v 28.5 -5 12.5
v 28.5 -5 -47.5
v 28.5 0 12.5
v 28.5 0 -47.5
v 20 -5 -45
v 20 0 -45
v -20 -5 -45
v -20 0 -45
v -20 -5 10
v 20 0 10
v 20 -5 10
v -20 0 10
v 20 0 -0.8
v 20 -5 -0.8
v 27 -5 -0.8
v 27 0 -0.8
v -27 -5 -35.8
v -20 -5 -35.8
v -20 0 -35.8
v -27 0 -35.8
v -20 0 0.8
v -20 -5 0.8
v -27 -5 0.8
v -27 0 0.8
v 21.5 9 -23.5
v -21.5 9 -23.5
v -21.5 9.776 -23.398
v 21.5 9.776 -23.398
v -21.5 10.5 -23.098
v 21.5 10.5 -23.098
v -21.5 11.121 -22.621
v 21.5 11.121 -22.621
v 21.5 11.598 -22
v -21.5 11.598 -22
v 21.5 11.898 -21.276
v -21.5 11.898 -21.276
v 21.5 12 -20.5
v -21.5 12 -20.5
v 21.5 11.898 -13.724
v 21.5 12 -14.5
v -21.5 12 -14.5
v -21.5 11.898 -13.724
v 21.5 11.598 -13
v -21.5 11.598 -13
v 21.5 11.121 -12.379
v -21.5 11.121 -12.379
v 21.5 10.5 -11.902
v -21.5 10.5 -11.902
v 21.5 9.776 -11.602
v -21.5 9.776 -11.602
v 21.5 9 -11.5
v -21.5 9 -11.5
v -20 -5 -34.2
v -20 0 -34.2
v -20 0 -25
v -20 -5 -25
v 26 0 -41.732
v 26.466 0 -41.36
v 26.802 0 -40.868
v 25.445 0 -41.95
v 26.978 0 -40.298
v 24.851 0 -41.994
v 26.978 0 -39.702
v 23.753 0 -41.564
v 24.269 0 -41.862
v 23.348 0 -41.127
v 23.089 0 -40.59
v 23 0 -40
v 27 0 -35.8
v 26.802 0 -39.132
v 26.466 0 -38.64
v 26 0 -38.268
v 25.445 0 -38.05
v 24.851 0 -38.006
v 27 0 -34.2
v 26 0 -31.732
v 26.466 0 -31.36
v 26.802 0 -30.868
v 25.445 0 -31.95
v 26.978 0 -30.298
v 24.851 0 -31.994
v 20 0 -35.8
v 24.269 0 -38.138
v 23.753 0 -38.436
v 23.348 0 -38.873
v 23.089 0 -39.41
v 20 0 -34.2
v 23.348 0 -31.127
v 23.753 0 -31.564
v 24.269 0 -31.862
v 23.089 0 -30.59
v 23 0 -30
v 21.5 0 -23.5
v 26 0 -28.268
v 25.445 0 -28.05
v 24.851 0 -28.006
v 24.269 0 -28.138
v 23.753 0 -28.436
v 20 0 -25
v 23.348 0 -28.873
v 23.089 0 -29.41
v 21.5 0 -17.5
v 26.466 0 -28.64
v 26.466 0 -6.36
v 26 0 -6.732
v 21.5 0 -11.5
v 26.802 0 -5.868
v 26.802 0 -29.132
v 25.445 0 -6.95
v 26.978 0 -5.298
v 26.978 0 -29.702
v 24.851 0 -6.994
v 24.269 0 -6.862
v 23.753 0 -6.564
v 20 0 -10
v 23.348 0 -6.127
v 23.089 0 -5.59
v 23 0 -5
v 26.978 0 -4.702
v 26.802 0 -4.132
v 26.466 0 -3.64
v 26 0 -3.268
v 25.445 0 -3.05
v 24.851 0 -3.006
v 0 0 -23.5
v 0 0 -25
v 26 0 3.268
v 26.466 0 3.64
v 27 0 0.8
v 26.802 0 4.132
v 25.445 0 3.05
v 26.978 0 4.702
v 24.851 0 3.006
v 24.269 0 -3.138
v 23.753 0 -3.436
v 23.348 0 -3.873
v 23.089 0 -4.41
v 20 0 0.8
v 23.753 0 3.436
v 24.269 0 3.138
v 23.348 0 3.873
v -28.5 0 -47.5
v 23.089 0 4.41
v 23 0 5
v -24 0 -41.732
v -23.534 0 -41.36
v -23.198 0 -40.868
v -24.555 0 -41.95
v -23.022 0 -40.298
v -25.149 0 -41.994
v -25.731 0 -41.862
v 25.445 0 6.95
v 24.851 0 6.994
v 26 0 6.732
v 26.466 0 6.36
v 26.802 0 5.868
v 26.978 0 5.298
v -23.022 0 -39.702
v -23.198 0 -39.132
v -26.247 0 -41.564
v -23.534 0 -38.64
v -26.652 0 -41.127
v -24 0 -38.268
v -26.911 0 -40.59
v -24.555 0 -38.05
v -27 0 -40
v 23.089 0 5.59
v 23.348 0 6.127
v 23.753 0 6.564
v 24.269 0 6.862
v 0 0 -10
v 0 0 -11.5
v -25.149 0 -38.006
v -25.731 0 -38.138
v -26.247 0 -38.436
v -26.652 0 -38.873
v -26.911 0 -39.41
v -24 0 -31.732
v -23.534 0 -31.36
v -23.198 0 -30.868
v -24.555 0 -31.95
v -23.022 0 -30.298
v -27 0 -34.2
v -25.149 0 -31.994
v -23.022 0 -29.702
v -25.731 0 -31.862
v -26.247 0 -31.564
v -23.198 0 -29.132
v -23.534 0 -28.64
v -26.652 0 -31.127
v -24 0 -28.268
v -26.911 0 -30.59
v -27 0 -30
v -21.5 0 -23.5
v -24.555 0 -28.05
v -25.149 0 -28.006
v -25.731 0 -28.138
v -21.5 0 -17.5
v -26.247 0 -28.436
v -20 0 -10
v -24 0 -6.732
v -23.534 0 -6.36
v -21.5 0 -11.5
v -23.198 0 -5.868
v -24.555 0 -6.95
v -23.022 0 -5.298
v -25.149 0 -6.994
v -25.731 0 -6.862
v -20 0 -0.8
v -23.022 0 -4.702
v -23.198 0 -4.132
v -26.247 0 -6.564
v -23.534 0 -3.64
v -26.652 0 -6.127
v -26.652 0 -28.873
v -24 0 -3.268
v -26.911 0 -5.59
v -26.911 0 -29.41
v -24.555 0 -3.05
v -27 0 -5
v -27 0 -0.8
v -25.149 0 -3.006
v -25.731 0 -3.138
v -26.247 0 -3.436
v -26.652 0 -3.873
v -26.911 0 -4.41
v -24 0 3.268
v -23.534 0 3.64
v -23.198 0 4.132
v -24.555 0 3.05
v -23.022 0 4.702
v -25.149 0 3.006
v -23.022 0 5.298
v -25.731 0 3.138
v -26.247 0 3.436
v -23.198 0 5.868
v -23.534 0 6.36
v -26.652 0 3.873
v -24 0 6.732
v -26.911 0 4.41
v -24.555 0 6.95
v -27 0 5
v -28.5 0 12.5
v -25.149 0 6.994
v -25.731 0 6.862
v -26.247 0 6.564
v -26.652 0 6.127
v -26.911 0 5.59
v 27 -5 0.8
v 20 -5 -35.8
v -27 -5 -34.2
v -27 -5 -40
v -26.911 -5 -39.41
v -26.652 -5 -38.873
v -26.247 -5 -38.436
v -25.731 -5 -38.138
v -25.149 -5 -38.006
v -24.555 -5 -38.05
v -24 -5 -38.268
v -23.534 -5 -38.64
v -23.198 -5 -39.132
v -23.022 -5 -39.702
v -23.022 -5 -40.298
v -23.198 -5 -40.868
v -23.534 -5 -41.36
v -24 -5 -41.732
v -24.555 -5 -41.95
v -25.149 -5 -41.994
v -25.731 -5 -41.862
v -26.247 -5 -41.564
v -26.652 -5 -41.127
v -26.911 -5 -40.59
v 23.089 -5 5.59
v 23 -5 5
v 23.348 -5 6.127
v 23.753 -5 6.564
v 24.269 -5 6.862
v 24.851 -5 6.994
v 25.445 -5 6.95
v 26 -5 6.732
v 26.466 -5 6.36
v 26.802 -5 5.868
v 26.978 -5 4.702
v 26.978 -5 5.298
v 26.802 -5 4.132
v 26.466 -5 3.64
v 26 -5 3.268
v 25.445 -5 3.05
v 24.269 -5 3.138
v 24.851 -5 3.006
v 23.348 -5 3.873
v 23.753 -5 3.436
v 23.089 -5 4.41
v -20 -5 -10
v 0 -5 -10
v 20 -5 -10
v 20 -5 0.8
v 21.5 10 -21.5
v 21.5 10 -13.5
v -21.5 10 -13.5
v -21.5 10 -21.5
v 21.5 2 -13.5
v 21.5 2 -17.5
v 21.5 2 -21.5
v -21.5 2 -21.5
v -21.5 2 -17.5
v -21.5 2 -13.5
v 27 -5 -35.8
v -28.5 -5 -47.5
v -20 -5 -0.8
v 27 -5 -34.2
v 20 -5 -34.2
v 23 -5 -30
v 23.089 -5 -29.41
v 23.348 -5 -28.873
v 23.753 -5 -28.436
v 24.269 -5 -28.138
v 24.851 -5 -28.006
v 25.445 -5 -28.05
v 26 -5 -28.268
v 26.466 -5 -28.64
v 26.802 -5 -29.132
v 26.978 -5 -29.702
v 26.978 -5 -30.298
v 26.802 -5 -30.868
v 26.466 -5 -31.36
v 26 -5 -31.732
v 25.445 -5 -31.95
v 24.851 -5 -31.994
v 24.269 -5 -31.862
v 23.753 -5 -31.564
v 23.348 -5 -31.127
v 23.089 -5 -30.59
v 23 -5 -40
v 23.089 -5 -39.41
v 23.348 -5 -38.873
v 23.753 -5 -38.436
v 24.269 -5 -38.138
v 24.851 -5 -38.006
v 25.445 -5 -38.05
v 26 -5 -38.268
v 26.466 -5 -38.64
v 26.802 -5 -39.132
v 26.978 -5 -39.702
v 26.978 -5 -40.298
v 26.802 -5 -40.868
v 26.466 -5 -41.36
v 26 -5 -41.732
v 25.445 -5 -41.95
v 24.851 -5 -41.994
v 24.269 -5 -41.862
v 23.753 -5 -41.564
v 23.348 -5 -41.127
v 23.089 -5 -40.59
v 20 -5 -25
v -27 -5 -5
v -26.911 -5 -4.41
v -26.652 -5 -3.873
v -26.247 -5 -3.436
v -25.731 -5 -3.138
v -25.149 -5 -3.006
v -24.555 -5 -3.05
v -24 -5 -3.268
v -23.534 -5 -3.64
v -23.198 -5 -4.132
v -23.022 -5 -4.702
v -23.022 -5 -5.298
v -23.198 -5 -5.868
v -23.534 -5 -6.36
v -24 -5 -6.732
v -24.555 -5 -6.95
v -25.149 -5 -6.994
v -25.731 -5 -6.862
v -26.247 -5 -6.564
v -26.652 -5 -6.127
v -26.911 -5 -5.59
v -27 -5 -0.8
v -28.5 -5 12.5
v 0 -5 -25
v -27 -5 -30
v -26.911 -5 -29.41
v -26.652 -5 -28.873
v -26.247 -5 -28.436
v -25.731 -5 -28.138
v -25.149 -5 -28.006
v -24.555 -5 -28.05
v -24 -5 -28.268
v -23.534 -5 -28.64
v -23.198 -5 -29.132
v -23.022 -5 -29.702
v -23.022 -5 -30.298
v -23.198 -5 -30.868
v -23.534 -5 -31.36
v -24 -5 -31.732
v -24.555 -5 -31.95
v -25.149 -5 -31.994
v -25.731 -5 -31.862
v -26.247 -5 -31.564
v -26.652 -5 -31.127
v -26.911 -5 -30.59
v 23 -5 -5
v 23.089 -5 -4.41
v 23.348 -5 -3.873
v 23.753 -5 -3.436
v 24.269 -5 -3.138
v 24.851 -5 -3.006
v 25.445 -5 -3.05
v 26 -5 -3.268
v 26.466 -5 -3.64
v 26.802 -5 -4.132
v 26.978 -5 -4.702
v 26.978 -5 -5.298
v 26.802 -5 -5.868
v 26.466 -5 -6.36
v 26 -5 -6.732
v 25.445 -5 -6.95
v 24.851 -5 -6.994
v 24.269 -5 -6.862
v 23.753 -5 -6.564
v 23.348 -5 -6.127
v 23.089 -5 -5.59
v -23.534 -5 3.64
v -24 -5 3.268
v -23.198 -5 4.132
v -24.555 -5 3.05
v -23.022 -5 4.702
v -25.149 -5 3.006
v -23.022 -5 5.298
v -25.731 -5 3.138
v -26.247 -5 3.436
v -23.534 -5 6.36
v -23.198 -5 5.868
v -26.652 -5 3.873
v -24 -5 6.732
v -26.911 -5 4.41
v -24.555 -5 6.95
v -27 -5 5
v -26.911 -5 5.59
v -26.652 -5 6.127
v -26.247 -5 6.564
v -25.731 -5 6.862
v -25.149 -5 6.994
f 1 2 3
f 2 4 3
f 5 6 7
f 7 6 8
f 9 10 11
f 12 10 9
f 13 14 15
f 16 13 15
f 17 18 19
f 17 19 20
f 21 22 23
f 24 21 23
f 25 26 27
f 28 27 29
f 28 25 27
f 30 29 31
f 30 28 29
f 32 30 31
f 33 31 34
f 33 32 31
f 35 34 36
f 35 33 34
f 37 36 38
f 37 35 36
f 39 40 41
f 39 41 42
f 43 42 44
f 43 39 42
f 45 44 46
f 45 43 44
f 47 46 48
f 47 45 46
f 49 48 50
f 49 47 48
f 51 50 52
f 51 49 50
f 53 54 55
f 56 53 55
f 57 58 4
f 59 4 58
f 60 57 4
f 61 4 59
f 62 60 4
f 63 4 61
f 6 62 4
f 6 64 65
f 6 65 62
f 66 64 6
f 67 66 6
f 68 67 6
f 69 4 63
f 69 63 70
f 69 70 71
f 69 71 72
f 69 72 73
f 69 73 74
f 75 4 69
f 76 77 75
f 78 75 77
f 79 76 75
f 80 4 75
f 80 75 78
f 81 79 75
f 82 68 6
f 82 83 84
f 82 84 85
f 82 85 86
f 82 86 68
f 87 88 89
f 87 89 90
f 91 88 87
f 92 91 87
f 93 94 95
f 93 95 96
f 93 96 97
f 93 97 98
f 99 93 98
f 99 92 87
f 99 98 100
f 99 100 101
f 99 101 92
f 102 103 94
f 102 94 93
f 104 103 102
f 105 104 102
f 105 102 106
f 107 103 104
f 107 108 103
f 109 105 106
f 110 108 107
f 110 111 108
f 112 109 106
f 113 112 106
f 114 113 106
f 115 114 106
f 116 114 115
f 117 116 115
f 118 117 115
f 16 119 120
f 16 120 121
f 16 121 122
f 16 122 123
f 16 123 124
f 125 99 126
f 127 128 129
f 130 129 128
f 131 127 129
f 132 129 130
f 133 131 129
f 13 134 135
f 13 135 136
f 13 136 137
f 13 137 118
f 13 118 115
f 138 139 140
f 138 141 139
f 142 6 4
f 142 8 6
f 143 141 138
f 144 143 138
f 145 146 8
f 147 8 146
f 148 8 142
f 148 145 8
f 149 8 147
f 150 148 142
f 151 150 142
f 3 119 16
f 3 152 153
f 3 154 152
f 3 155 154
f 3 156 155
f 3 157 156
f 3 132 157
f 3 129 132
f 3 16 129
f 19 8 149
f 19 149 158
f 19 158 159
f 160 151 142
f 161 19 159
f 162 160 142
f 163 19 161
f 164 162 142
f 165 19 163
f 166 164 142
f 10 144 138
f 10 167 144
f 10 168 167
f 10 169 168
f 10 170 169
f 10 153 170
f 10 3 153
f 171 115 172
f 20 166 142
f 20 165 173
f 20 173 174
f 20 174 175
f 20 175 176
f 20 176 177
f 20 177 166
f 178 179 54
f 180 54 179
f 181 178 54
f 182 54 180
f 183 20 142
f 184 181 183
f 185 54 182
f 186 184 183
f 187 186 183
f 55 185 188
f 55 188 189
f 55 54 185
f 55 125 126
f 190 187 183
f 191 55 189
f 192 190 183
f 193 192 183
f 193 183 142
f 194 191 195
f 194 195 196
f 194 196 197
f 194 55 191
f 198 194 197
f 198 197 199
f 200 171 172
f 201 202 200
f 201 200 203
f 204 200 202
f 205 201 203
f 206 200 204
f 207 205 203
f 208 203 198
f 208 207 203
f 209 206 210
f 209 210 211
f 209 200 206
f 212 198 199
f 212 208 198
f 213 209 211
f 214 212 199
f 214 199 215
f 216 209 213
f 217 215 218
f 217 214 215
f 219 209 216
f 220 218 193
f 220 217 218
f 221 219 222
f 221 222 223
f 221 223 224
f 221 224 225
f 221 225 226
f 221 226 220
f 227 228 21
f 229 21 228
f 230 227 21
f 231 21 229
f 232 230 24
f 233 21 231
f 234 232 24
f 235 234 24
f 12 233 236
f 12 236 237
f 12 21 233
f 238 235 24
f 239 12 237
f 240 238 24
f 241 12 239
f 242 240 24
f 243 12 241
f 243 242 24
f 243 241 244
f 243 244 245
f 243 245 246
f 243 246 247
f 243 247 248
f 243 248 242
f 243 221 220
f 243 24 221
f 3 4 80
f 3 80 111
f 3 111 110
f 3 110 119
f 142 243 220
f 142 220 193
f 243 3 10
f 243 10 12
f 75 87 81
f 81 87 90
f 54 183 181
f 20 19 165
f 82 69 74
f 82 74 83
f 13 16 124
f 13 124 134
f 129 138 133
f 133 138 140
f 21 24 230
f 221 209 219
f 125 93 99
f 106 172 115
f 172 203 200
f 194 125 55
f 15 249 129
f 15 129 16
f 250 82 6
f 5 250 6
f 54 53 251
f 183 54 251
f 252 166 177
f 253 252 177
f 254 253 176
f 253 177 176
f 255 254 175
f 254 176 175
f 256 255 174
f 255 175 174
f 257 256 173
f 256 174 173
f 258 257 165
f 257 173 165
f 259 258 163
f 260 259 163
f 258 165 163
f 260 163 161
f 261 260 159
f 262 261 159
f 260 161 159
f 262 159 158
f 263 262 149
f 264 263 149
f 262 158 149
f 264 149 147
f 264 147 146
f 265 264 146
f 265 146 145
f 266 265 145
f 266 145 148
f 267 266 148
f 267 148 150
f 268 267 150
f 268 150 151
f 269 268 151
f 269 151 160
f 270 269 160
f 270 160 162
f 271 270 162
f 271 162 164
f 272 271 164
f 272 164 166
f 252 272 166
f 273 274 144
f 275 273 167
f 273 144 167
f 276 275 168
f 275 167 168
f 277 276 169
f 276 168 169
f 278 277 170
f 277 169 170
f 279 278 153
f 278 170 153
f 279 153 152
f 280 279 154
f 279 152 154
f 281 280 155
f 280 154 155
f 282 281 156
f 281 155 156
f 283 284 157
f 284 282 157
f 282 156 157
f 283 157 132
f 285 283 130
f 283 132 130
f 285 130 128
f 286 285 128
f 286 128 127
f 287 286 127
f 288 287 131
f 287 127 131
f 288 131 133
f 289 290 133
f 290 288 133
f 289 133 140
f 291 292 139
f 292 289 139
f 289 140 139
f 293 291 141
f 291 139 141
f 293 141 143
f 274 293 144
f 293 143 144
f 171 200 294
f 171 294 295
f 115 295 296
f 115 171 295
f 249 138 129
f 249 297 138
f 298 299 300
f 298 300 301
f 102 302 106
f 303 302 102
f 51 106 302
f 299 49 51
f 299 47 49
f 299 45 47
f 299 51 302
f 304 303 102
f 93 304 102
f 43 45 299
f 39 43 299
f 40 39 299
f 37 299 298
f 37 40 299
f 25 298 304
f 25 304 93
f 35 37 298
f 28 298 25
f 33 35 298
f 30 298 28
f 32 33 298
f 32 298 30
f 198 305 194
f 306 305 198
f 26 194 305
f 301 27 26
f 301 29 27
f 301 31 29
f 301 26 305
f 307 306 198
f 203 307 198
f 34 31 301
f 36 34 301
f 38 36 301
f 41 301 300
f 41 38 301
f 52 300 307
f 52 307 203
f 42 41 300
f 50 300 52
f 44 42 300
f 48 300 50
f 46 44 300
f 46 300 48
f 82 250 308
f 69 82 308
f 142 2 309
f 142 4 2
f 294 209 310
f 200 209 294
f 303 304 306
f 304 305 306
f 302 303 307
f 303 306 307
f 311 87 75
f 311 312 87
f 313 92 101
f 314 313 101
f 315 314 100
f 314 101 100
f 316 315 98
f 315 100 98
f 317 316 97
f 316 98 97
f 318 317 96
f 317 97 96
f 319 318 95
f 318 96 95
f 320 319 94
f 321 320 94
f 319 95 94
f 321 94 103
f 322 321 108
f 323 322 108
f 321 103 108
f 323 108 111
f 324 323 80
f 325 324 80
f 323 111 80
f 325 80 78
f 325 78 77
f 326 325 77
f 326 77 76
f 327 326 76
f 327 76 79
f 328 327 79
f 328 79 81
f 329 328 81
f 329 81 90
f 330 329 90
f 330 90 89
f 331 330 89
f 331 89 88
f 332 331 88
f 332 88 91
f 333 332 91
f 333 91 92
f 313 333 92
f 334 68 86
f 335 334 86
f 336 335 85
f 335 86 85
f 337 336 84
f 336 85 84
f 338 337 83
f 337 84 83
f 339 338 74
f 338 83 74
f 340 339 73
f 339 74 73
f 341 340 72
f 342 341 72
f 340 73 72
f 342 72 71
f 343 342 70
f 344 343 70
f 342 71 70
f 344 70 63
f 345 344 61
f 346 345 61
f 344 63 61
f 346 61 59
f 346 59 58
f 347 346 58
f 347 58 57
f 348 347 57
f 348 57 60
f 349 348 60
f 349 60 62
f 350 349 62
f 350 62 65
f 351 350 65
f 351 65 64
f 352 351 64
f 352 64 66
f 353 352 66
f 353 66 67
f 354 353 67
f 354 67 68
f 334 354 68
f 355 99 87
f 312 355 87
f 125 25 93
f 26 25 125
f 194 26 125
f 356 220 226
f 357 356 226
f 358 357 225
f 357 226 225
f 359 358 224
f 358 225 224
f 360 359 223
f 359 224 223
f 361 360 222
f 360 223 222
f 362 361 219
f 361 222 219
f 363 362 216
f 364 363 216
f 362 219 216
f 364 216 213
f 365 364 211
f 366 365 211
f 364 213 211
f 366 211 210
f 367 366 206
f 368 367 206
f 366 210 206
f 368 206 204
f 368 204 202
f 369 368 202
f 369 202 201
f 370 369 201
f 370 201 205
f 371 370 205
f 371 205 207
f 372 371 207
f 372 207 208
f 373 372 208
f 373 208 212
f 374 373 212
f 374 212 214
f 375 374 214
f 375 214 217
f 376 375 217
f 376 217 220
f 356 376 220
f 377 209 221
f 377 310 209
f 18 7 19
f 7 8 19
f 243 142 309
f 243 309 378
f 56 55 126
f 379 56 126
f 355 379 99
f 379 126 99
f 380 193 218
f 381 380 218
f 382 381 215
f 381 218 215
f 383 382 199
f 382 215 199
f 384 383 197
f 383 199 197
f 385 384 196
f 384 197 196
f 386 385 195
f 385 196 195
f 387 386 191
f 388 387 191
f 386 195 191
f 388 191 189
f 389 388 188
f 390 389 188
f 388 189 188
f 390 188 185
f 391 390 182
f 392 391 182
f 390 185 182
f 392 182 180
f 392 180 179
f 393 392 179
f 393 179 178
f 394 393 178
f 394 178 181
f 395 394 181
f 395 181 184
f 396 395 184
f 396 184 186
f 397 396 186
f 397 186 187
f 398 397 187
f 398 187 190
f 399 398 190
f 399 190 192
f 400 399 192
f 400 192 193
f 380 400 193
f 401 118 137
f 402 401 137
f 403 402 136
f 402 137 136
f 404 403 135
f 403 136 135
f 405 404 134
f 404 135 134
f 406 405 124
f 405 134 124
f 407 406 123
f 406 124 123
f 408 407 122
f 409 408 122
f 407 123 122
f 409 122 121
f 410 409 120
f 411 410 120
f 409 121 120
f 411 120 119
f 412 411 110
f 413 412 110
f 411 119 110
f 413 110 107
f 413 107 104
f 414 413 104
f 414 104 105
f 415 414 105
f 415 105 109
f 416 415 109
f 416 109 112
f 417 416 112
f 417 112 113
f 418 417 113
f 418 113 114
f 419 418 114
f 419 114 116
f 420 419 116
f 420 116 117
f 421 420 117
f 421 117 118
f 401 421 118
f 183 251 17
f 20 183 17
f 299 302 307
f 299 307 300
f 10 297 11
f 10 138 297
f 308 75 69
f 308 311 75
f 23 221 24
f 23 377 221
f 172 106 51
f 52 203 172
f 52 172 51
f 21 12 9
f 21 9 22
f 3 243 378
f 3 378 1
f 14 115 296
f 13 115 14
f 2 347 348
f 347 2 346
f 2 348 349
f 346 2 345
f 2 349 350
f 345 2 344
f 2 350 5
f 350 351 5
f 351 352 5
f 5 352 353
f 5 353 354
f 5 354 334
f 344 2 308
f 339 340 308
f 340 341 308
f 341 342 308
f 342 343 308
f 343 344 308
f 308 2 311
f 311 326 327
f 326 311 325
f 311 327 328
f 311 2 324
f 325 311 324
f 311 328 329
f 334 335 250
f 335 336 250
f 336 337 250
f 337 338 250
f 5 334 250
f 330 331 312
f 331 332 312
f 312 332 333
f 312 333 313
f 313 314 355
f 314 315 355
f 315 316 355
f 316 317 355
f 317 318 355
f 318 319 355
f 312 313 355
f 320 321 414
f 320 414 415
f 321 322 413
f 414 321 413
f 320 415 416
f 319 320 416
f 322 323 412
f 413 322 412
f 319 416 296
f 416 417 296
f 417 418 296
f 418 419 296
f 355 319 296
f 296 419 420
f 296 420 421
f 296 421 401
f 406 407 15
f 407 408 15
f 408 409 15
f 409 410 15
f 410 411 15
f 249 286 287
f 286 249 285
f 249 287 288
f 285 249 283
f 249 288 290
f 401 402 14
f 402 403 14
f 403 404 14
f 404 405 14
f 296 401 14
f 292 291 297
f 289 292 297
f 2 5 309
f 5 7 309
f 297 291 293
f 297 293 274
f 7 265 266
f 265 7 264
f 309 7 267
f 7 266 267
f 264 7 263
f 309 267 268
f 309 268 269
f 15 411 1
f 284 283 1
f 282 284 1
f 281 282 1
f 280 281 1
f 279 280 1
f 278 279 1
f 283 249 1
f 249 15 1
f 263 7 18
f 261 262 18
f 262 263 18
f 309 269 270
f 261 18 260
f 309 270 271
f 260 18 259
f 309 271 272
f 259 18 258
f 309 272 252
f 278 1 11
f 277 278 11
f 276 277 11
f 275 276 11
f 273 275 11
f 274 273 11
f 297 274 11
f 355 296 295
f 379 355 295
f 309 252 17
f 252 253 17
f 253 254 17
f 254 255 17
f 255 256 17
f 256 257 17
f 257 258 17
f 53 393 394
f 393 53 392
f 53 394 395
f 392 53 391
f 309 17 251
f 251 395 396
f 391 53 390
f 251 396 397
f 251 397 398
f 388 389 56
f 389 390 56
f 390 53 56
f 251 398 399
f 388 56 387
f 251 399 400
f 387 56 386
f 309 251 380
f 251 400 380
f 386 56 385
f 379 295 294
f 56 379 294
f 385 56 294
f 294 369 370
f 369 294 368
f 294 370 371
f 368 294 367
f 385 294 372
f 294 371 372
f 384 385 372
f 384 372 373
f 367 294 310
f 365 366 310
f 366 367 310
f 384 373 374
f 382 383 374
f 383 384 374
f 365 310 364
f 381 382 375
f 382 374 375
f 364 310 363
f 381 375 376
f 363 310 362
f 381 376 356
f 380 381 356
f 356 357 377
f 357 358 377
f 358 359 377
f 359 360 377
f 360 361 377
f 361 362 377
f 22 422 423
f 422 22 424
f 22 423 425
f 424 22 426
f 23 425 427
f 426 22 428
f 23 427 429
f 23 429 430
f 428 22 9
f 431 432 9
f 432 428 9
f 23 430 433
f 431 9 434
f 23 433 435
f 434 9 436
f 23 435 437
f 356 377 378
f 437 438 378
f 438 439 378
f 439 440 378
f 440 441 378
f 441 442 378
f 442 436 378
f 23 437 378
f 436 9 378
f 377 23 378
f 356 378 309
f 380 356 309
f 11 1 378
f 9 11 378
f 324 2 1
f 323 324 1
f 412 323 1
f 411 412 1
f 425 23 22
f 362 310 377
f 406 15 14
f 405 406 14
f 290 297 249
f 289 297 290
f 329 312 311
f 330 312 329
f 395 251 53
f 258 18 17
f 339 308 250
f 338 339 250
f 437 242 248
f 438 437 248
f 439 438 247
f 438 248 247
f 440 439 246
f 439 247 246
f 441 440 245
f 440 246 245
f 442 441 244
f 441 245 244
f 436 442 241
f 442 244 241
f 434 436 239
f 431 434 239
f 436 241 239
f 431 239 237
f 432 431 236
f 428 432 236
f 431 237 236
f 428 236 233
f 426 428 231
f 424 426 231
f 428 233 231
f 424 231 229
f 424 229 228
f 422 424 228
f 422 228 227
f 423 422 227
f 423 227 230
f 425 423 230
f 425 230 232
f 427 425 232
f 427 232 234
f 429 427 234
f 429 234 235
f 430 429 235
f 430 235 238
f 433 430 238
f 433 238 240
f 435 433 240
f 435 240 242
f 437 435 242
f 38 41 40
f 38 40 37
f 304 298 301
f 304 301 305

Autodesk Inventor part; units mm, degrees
ref_plane "YZ Plane" through (0, 0, 0) normal (1, 0, 0) x (0, 1, 0)
ref_plane "XZ Plane" through (0, 0, 0) normal (0, 1, 0) x (-1, 0, 0)
ref_plane "XY Plane" through (0, 0, 0) normal (0, 0, 1) x (1, 0, 0)
sketch "Szkic1" plane through (0, 0, 0) normal (0, 1, 0) x (-1, 0, 0)
  line L0 (0, 0) -> (0, -35)
  circle A0 centre (0, 0) radius 2
  circle A1 centre (0, -35) radius 2
  line L1 (0, 0) -> (0, -35) construction
  line L2 (-25, 0) -> (-25, -35)
  line L3 (25, -35) -> (25, 0)
  arc A2 (25, 0) -> (-25, 0) centre (0, 0) ccw
  arc A3 (-25, -35) -> (25, -35) centre (0, -35) ccw
  line L4 (-20, -45) -> (20, -45)
  line L5 (20, -45) -> (20, -25)
  line L6 (20, -25) -> (-20, -25)
  line L7 (-20, -25) -> (-20, -45)
  line L8 (-20, -45) -> (20, -25) construction
  line L9 (20, -45) -> (-20, -25) construction
  line L10 (0, -17.5) -> (-25, -17.5) construction
  line L11 (0, -35) -> (0, 0)
  circle A4 centre (0, 0) radius 2
  line L12 (0, -35) -> (0, 0) construction
  line L13 (-20, 10) -> (20, 10)
  line L14 (20, 10) -> (20, -10)
  line L15 (20, -10) -> (-20, -10)
  line L16 (-20, 10) -> (20, -10) construction
  line L17 (20, 10) -> (-20, -10) construction
  line L18 (-20, -10) -> (-20, 10)
  line L19 (0, -17.5) -> (-400, -17.5) construction
  line L20 (0, -17.5) -> (400, -17.5) construction
  line L21 (21.5, 12.5) -> (-21.5, 12.5)
  line L22 (-21.5, 12.5) -> (-21.5, -47.5)
  line L23 (-21.5, -47.5) -> (21.5, -47.5)
  line L24 (21.5, -47.5) -> (21.5, 12.5)
  line L25 (21.5, 12.5) -> (-21.5, -47.5) construction
  line L26 (-21.5, 12.5) -> (21.5, -47.5) construction
  line L27 (21.5, -47.5) -> (28.5, -47.5)
  line L28 (28.5, -47.5) -> (28.5, 12.5)
  line L29 (28.5, 12.5) -> (21.5, 12.5)
  line L30 (21.5, 12.5) -> (21.5, -47.5)
  line L31 (20, 10) -> (20, -10)
  line L32 (20, 0) -> (20, -10)
  circle A5 centre (25, -5) radius 2
  line L33 (20, 0) -> (28.5, 0) construction
  circle A6 centre (25, 5) radius 2
  circle A7 centre (-25, -5) radius 2
  circle A8 centre (-25, 5) radius 2
  line L34 (-21.5, -47.5) -> (-21.5, 12.5)
  line L35 (-21.5, -47.5) -> (-28.5, -47.5)
  line L36 (-28.5, -47.5) -> (-28.5, 12.5)
  line L37 (-28.5, 12.5) -> (-21.5, 12.5)
  circle A9 centre (25, -30) radius 2
  circle A10 centre (25, -40) radius 2
  circle A11 centre (-25, -30) radius 2
  circle A12 centre (-25, -40) radius 2
  point P0 (20, -5)
  dimension "d0" = 35
  dimension "d1" = 4
  dimension "d2" = 4
  dimension "d3" = 50
  dimension "d6" = 40
  dimension "d7" = 20
  dimension "d8" = 400
  dimension "d9" = 180
  dimension "d10" = 43
  dimension "d11" = 60
  dimension "d21" = 7
  dimension "d22" = 60
  dimension "d24" = 4
  dimension "d25" = 5
  dimension "d26" = 5
extrude "Wyciągnięcie proste1" add sketch "Szkic1" against normal blind 5 contours L21 L24 L23 L22
sketch "Szkic2" plane through (-21.5, 0, -47.5) normal (-1, 0, 0) x (0, 0, 1)
  line L0 (22.5, 0) -> (22.5, -5) projected
  line L1 (37.5, 0) -> (37.5, -5) projected
  line L2 (22.5, 0) -> (37.5, 0)
  line L3 (30, 0) -> (30, 6)
  line L4 (36, 12) -> (24, 12)
  line L5 (24, 12) -> (24, 0)
  line L6 (24, 0) -> (36, 0)
  line L7 (36, 0) -> (36, 12)
  line L8 (36, 12) -> (24, 0) construction
  line L9 (24, 12) -> (36, 0) construction
  line L10 (34, 10) -> (26, 10)
  line L11 (26, 10) -> (26, 2)
  line L12 (26, 2) -> (34, 2)
  line L13 (34, 2) -> (34, 10)
  line L14 (34, 10) -> (26, 2) construction
  line L15 (26, 10) -> (34, 2) construction
  point P0 (47.5, 0)
  point P1 (36, 0)
  point P2 (24, 0)
  dimension "d12" = 6
  dimension "d13" = 12
  dimension "d14" = 12
  dimension "d15" = 8
  dimension "d16" = 8
extrude "Wyciągnięcie proste2" add sketch "Szkic2" against normal up to surface (43 mm away)
fillet "Zaokrąglenie2" radius 3 2 edges at (0, 12, -11.5) (0, 12, -23.5)
extrude "Wyciągnięcie proste3" add sketch "Szkic1" against normal blind 5 contours A2 A8 L37 L22 L35 A3 A12 L2 A11 A7 | L2 A7 A11 A3 A12 L35 L36 L37 A2 A8 | L29 L28 L27 A3 A10 L3 A9 A5 A2 A6 | A2 A6 L3 A5 A9 A3 A10 L27 L24 L29
sketch "Szkic3" plane through (-21.5, 0, -23.5) normal (-1, 0, 0) x (0, 0, 1)
  line L0 (10, 2) -> (2, 2) construction
  line L1 (2, 10) -> (10, 10) construction
  line L2 (10, 2) -> (2, 10) construction
  line L3 (10, 10) -> (10, 2) construction
  line L4 (2, 2) -> (10, 10) construction
  line L5 (2, 10) -> (10, 10) construction
  line L6 (10, 10) -> (10, 2) construction
  line L7 (10, 2) -> (2, 2) construction
  line L8 (2, 2) -> (2, 10) construction
  line L9 (2, 10) -> (10, 2) construction
  line L10 (10, 10) -> (2, 2) construction
  point P0 (23.5, 0)
  point P1 (6, 6)
sketch "Szkic4" plane through (0, -5, 0) normal (0, -1, 0) x (1, 0, 0)
  line L0 (20, -10) -> (20, 10) projected
  line L1 (20, 0) -> (20, 0.8)
  line L2 (20, 0) -> (22.1856, 0) construction
  line L3 (20, 0.8) -> (27, 0.8)
  line L4 (27, 0.8) -> (27, 0)
  line L5 (20, 10) -> (20, -10)
  line L6 (20, -0.8) -> (27, -0.8)
  line L7 (27, -0.8) -> (27, 0)
  line L8 (20, 10) -> (-20, 10) projected
  line L9 (0, 10) -> (0, -45)
  line L10 (-20, -45) -> (20, -45) projected
  line L11 (28.5, 12.5) -> (28.5, -47.5) projected
  line L12 (28.5, -17.5) -> (-28.5, -17.5)
  line L13 (-28.5, -47.5) -> (-28.5, 12.5) projected
  line L14 (-20, -10) -> (-20, 10)
  line L15 (-20, 0) -> (-20, 0.8)
  line L16 (-20, 0) -> (-22.1856, 0) construction
  line L17 (-20, 0.8) -> (-27, 0.8)
  line L18 (-27, 0.8) -> (-27, 0)
  line L19 (-20, -0.8) -> (-27, -0.8)
  line L20 (-27, -0.8) -> (-27, 0)
  line L21 (20, -25) -> (20, -45)
  line L22 (20, -35) -> (20, -35.8)
  line L23 (20, -35) -> (22.1856, -35) construction
  line L24 (20, -35.8) -> (27, -35.8)
  line L25 (20, -34.2) -> (27, -34.2)
  line L26 (20, -45) -> (20, -25)
  line L27 (20, -45) -> (-20, -45)
  line L28 (-20, -35) -> (-20, -35.8)
  line L29 (-20, -35) -> (-22.1856, -35) construction
  line L30 (-20, -34.2) -> (-27, -34.2)
  line L31 (-20, -25) -> (-20, -45)
  line L32 (-20, -35.8) -> (-27, -35.8)
  line L33 (27, -34.2) -> (27, -35.8)
  line L34 (-27, -34.2) -> (-27, -35.8)
  point P0 (0, 0)
  point P1 (0, -35)
  dimension "d29" = 0.8
  dimension "d30" = 7
extrude "Wyciągnięcie proste4" cut sketch "Szkic4" against normal blind 10
sketch "Szkic5" plane through (0, -5, 0) normal (0, -1, 0) x (1, 0, 0)
  line L0 (-20, -35.8) -> (-27, -35.8) projected
  line L1 (-27, -35.8) -> (-27, -34.2) projected
  line L2 (-27, -34.2) -> (-20, -34.2) projected
  line L3 (-20, -34.2) -> (-20, -25) projected
  line L4 (-20, -25) -> (20, -25) projected
  line L5 (20, -25) -> (20, -34.2) projected
  line L6 (20, -34.2) -> (27, -34.2) projected
  line L7 (27, -34.2) -> (27, -35.8) projected
  line L8 (27, -35.8) -> (20, -35.8) projected
  line L9 (20, -35.8) -> (20, -45) projected
  line L10 (20, -45) -> (-20, -45) projected
  line L11 (-20, -45) -> (-20, -35.8) projected
  line L12 (28.5, 12.5) -> (-28.5, 12.5) projected
  line L13 (-28.5, 12.5) -> (-28.5, -47.5) projected
  line L14 (-28.5, -47.5) -> (28.5, -47.5) projected
  line L15 (28.5, -47.5) -> (28.5, 12.5) projected
  circle A0 centre (-25, -40) radius 2 projected
  circle A1 centre (-25, -30) radius 2 projected
  circle A2 centre (-25, -5) radius 2 projected
  circle A3 centre (-25, 5) radius 2 projected
  circle A4 centre (25, 5) radius 2 projected
  circle A5 centre (25, -5) radius 2 projected
  circle A6 centre (25, -30) radius 2 projected
  circle A7 centre (25, -40) radius 2 projected
  line L16 (-27, 0.8) -> (-20, 0.8) projected
  line L17 (-20, 0.8) -> (-20, 10) projected
  line L18 (-20, 10) -> (20, 10) projected
  line L19 (20, 10) -> (20, 0.8) projected
  line L20 (20, 0.8) -> (27, 0.8) projected
  line L21 (27, 0.8) -> (27, -0.8) projected
  line L22 (27, -0.8) -> (20, -0.8) projected
  line L23 (20, -0.8) -> (20, -10) projected
  line L24 (20, -10) -> (-20, -10) projected
  line L25 (-20, -10) -> (-20, -0.8) projected
  line L26 (-20, -0.8) -> (-27, -0.8) projected
  line L27 (-27, -0.8) -> (-27, 0.8) projected
  point P0 (0, 0)
properties part number "base"
